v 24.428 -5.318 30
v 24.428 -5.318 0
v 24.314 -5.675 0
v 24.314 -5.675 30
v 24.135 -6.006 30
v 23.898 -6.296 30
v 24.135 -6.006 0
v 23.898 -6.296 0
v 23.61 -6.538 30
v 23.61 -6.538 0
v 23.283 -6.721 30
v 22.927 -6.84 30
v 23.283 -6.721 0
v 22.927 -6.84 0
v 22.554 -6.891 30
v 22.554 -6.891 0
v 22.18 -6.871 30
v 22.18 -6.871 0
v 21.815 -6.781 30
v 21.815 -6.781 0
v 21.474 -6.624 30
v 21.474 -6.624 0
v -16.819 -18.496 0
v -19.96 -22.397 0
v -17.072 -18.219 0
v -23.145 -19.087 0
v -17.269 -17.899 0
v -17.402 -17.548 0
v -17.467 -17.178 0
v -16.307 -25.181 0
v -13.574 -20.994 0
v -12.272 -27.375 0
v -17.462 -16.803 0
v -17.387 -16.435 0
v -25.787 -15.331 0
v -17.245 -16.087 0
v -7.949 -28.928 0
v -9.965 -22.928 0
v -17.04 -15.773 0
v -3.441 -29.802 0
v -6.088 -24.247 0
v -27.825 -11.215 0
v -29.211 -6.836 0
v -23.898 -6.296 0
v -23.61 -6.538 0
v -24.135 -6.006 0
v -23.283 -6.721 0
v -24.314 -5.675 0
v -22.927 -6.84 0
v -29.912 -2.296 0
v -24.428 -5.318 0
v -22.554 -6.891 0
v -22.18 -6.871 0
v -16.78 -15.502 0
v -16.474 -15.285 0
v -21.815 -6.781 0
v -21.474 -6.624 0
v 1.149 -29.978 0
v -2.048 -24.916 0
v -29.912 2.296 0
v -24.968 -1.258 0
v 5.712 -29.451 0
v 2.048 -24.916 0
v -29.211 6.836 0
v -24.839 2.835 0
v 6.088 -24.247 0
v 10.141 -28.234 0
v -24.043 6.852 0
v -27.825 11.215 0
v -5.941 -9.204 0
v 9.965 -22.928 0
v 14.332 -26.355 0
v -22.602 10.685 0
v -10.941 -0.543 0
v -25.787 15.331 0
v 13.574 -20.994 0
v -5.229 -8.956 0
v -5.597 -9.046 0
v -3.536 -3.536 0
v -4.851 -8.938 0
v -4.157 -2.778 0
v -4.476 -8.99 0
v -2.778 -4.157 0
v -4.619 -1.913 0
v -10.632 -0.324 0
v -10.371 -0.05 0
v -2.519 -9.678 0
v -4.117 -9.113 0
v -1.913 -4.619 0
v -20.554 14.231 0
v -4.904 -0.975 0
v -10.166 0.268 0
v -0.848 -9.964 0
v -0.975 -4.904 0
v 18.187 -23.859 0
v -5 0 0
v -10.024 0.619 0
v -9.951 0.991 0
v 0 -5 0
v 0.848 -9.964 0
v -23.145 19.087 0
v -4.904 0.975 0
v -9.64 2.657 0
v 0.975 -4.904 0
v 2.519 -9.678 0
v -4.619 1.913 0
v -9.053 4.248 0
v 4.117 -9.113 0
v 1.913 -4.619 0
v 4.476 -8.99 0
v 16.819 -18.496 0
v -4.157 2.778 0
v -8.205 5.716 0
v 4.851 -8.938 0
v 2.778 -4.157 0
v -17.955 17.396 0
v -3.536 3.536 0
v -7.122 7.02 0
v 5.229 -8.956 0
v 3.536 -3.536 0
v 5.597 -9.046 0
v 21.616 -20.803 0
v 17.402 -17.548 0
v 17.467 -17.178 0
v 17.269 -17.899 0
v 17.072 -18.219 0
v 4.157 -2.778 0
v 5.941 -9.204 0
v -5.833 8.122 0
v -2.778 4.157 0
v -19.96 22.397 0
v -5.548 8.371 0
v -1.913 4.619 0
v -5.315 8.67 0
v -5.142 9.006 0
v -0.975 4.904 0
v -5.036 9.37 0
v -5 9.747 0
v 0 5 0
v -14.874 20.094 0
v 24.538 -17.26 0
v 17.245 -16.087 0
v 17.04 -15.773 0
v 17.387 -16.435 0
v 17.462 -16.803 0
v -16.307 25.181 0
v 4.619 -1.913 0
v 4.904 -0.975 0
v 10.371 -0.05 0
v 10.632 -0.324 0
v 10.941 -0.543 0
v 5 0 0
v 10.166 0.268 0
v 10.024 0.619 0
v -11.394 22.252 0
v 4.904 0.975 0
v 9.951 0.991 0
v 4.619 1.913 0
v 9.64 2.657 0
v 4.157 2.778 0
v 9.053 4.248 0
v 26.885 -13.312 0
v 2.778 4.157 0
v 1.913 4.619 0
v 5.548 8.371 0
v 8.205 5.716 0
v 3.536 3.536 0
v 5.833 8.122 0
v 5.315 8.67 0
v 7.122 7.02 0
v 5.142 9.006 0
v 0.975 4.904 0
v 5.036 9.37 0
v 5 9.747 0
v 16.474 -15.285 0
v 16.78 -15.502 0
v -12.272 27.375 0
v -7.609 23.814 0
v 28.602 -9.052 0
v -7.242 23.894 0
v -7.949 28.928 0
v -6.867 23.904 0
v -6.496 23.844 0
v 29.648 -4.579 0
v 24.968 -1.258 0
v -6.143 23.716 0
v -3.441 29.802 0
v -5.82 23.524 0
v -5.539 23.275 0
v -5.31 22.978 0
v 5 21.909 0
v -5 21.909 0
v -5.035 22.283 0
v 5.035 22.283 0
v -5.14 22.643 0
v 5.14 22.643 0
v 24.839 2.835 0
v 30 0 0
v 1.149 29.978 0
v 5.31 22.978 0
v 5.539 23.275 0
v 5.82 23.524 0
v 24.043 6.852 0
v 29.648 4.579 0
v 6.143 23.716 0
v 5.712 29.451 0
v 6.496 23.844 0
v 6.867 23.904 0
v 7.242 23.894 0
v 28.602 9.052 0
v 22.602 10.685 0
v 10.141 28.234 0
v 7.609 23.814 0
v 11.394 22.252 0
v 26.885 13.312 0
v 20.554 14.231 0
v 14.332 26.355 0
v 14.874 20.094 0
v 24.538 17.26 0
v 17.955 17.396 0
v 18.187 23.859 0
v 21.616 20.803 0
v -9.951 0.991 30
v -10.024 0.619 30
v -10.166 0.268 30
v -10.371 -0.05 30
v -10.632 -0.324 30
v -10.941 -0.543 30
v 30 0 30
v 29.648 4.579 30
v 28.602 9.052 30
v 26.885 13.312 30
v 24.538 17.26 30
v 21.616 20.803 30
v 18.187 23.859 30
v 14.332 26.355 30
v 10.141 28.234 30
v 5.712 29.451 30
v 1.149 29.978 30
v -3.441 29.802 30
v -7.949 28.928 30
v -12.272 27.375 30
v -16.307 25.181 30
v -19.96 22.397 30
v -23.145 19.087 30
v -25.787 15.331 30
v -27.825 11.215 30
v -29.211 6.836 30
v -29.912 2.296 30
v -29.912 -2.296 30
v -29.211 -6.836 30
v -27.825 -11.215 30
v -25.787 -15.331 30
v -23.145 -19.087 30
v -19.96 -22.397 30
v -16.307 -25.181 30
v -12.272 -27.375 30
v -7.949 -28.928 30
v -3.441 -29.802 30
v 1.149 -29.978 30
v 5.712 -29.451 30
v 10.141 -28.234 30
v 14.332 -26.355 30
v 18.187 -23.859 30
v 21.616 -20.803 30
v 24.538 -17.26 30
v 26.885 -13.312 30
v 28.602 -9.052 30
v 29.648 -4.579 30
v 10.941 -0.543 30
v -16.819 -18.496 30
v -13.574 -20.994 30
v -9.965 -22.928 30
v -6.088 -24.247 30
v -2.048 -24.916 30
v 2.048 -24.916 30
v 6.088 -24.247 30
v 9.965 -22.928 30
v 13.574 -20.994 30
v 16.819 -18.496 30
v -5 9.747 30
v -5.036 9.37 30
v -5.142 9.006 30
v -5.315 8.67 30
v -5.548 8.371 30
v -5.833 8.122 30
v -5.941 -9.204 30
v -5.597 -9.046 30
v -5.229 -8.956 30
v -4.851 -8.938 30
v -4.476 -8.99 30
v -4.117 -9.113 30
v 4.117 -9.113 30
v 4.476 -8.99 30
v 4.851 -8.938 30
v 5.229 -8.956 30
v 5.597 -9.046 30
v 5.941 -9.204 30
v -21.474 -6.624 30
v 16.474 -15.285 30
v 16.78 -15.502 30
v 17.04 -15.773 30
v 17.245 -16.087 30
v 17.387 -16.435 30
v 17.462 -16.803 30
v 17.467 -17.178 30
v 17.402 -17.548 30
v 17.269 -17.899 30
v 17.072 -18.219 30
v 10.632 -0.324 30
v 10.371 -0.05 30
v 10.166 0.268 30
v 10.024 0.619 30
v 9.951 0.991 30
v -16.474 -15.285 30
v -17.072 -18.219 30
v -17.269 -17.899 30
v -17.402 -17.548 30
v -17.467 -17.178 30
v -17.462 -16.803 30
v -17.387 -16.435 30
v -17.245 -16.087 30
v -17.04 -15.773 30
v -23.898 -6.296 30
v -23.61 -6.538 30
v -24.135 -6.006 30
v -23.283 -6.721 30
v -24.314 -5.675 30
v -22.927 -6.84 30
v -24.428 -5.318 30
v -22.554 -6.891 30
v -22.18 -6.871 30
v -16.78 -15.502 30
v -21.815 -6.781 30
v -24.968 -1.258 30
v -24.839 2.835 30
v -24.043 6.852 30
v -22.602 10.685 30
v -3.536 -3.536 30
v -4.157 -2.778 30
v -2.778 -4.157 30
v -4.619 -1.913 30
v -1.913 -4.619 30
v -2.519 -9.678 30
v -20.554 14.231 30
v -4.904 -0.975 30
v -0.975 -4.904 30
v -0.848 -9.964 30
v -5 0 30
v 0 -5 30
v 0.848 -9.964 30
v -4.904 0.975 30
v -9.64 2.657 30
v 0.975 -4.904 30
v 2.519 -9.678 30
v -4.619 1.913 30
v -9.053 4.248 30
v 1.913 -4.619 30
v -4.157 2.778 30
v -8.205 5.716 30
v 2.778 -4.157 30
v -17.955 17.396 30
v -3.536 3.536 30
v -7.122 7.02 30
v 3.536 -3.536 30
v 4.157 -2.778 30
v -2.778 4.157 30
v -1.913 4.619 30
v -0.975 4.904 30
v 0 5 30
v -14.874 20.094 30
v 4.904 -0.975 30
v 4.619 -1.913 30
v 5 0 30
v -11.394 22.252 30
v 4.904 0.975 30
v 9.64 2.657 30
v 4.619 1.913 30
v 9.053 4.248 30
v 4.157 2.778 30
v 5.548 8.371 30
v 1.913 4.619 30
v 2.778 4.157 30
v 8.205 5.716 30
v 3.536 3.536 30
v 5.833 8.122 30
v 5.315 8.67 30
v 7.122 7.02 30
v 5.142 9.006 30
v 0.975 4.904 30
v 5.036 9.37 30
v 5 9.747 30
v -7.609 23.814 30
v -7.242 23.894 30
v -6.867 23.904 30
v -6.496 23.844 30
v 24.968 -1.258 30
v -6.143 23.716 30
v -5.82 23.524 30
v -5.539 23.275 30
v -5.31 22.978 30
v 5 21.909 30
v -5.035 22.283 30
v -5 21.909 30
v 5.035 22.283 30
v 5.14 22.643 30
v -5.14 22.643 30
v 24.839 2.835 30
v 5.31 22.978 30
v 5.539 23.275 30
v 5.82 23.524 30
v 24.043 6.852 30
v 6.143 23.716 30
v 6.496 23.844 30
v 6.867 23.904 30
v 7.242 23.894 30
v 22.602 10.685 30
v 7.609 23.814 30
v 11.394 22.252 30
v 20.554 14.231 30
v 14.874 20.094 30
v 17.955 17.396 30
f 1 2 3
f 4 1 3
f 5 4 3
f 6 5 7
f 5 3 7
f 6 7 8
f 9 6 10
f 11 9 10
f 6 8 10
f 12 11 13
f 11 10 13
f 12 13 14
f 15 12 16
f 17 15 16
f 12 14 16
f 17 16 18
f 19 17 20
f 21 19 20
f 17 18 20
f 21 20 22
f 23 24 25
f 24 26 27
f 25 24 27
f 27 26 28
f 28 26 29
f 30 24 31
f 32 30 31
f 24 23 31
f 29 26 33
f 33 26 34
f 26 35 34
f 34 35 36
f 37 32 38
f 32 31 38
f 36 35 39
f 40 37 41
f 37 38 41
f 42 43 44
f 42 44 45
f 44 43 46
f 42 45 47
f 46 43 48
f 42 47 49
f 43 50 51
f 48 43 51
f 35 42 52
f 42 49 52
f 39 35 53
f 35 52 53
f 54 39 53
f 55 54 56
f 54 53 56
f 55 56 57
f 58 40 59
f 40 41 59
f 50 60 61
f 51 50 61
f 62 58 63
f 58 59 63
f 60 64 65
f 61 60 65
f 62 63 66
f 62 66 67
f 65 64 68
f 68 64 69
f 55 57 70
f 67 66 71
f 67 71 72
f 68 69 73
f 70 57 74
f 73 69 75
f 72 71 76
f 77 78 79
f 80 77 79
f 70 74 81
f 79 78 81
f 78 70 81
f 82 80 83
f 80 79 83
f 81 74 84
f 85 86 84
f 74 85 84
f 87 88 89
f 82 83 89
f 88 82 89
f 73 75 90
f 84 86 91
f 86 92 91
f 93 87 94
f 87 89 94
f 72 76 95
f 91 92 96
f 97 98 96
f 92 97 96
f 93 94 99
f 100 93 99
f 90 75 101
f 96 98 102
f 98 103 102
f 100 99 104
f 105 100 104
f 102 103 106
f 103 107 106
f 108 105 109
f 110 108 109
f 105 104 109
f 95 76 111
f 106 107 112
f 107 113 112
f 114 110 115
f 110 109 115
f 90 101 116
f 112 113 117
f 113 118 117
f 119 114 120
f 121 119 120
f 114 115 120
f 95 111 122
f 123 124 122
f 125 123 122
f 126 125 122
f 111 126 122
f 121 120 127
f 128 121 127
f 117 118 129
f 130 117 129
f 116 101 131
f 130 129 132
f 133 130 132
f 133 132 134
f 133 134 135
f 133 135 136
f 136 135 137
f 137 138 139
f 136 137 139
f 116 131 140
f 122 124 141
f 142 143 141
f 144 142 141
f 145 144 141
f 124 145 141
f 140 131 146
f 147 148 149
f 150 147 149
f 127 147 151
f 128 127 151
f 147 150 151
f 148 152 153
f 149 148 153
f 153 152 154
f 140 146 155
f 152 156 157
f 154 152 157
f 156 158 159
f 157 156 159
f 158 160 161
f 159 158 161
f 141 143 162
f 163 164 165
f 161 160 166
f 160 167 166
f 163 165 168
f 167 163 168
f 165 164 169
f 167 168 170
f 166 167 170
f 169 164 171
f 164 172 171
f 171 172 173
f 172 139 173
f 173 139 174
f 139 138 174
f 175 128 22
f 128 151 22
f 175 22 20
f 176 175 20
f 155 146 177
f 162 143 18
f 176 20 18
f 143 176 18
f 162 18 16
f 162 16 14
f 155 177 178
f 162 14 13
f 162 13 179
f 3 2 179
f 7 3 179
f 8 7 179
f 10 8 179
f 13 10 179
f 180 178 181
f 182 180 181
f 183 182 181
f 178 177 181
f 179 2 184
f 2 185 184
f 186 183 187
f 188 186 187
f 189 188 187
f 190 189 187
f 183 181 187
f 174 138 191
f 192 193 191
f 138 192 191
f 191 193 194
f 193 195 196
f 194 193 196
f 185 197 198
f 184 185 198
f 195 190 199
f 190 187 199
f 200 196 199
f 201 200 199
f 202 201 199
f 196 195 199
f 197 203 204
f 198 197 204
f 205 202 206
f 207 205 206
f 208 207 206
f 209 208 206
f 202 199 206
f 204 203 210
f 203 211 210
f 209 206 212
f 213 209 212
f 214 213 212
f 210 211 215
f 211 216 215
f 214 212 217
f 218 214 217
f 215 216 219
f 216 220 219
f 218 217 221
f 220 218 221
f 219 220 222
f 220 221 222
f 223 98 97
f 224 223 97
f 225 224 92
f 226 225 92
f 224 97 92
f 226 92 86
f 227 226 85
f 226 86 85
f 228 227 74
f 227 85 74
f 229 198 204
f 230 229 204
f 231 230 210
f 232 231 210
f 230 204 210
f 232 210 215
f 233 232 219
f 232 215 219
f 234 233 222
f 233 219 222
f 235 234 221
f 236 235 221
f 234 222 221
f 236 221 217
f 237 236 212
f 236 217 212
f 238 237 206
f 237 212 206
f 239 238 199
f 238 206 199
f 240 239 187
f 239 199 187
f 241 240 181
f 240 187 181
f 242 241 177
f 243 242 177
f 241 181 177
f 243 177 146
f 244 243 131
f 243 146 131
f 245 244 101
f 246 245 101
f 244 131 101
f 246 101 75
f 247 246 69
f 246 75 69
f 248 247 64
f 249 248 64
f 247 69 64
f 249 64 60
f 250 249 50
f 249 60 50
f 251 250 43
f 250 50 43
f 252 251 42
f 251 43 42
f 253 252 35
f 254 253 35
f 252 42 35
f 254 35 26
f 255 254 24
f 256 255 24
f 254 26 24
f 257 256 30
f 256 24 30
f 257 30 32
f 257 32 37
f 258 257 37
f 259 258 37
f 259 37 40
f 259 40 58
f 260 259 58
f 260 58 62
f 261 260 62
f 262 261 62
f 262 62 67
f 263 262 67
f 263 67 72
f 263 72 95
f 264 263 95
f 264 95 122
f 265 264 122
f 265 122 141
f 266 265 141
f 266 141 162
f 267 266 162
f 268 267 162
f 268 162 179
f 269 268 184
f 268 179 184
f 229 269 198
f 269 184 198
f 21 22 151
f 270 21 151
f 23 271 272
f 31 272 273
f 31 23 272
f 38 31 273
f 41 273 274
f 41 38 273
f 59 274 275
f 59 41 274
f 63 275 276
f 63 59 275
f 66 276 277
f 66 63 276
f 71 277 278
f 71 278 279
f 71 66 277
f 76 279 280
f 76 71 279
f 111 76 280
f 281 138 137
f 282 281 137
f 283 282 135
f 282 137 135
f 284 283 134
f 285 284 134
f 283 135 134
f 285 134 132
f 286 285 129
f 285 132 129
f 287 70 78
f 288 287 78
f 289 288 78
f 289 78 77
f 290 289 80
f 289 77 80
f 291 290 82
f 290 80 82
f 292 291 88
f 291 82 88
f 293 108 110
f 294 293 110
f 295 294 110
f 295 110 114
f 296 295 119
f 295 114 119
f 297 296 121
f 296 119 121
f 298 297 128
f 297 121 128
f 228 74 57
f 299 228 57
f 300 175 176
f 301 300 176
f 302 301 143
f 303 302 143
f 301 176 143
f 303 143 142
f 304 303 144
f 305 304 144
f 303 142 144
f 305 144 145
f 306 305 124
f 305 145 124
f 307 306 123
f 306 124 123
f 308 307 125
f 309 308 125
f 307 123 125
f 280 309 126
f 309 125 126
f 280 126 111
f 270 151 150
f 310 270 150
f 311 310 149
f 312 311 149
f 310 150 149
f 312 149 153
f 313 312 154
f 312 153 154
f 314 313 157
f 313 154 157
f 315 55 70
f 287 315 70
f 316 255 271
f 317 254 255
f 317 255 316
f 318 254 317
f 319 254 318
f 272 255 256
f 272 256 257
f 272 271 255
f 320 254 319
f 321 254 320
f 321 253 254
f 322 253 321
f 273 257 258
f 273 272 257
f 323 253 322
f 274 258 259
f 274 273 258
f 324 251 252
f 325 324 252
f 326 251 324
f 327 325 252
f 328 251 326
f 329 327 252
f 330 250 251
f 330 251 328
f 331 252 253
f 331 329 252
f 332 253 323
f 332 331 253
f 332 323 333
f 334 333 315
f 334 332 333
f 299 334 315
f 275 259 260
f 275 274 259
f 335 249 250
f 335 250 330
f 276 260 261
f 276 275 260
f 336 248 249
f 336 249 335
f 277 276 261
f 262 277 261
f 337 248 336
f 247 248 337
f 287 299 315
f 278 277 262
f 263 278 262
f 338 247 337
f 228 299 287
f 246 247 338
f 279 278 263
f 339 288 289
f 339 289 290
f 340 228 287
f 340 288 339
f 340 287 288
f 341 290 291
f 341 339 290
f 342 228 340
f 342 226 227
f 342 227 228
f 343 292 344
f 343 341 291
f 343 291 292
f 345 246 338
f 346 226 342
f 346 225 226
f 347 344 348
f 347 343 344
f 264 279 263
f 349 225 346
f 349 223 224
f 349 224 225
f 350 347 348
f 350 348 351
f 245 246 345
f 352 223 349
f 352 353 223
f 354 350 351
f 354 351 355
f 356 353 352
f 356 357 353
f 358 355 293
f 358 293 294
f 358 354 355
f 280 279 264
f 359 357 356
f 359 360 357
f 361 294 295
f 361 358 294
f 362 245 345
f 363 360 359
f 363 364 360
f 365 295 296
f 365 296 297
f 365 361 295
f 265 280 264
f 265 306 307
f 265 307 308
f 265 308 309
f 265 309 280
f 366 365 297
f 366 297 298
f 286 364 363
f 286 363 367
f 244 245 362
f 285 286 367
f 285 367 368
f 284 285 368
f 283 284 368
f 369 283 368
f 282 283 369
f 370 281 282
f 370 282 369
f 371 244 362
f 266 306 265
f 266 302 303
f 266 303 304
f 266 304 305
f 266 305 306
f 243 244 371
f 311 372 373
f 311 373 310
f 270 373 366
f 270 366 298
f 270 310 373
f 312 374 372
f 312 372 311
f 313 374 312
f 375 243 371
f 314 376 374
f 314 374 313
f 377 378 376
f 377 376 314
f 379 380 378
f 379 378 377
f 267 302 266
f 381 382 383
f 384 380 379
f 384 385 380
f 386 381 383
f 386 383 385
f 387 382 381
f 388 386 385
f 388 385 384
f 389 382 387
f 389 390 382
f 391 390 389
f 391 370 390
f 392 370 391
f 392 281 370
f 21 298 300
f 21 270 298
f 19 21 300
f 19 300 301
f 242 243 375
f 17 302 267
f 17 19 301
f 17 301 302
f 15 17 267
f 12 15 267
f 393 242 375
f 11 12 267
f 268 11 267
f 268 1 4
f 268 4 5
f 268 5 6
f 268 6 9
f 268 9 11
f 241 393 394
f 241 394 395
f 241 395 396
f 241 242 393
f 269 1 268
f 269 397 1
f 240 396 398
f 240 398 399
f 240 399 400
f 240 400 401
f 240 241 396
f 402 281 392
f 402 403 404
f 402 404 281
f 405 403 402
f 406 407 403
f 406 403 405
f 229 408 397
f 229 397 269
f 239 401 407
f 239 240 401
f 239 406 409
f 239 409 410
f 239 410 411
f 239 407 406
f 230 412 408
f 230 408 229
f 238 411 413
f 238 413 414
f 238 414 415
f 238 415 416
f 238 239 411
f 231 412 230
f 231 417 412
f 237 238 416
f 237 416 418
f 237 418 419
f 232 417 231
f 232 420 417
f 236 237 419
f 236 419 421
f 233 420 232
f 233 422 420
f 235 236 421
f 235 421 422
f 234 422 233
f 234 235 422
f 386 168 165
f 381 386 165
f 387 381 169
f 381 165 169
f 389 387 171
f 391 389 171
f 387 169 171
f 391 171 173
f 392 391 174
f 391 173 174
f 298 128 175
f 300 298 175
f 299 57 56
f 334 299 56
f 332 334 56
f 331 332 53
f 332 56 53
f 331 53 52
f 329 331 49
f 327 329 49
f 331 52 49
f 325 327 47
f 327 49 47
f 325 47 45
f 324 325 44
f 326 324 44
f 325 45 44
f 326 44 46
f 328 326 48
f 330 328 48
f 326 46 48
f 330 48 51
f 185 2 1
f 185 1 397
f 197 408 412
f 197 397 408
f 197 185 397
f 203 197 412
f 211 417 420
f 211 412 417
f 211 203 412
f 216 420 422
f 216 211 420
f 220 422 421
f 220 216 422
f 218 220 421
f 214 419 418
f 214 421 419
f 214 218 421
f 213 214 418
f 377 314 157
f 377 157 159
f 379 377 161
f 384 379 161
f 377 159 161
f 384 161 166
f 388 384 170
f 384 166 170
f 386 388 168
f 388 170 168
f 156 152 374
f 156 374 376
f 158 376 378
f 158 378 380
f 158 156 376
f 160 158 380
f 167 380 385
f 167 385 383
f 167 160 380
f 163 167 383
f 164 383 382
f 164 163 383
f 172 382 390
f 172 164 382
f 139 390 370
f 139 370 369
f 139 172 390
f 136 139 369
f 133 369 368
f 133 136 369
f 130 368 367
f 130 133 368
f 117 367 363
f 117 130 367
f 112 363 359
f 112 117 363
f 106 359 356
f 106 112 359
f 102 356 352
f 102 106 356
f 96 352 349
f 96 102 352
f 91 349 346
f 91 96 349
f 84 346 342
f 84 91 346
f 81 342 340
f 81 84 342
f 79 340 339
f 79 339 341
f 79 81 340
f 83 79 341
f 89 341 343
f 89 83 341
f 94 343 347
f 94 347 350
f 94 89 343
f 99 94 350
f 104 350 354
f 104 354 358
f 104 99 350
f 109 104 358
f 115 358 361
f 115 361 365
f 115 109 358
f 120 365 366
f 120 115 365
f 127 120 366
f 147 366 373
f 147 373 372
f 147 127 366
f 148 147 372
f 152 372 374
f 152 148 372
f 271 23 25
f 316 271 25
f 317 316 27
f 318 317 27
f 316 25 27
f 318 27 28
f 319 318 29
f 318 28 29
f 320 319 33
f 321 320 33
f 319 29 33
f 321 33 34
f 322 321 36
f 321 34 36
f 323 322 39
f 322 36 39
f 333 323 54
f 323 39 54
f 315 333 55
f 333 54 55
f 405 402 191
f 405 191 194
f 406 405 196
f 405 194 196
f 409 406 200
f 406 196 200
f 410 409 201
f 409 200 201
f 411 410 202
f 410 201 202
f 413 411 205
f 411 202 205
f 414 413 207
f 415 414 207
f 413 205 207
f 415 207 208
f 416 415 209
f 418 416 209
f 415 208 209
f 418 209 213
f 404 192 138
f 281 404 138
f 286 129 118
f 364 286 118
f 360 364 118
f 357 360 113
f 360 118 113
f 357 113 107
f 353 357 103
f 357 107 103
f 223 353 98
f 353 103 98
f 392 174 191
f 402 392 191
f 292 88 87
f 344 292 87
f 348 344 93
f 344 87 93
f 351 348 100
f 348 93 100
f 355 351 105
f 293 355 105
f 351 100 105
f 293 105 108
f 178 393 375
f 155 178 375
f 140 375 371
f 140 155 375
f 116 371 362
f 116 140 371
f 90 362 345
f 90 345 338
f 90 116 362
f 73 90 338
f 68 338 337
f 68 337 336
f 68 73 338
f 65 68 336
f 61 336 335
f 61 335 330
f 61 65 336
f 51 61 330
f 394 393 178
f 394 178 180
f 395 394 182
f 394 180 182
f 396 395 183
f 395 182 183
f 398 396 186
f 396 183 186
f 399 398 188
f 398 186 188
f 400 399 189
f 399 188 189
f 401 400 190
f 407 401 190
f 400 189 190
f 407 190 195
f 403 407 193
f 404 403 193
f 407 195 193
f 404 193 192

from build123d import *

# Parameters (mm, degrees)
SKETCH1_R           = 30
SKETCH1_R_2         = 25
SKETCH1_R_3         = 10
SKETCH1_R_4         = 5
BOSS_EXTRUDE1_DEPTH = 30


with BuildPart() as part:
    # Sketch1 → Boss-Extrude1 (new body)
    # profile 1 of 5: a face of its own
    with BuildSketch(Plane.XY):
        Circle(SKETCH1_R)
        Circle(SKETCH1_R_2, mode=Mode.SUBTRACT)
    # profile 2 of 5: a face of its own
    with BuildSketch(Plane.XY):
        with BuildLine():
            ThreePointArc((-7.608695652, 23.814024239), (-5.820464351, 23.524048006), (-5, 21.9089023))
            Line((-5, 21.9089023), (-5, 9.746794345))
            ThreePointArc((-5, 9.746794345), (-5.220486958, 8.833923416), (-5.833333333, 8.122328621))
            ThreePointArc((-5.833333333, 8.122328621), (0, 10), (5.833333333, 8.122328621))
            ThreePointArc((5.833333333, 8.122328621), (5.220486958, 8.833923416), (5, 9.746794345))
            Line((5, 9.746794345), (5, 21.9089023))
            ThreePointArc((5, 21.9089023), (5.820464351, 23.524048006), (7.608695652, 23.814024239))
            ThreePointArc((7.608695652, 23.814024239), (0, 25), (-7.608695652, 23.814024239))
        make_face()
    # profile 3 of 5: a face of its own
    with BuildSketch(Plane.XY):
        with BuildLine():
            ThreePointArc((-21.473665961, -6.624324131), (-23.282655349, -6.721354014), (-24.427897784, -5.317688395))
            ThreePointArc((-24.427897784, -5.317688395), (-21.650635095, -12.5), (-16.819202132, -18.496335844))
            ThreePointArc((-16.819202132, -18.496335844), (-17.462190998, -16.802693993), (-16.473665961, -15.284578169))
            Line((-16.473665961, -15.284578169), (-5.940971508, -9.203524191))
            ThreePointArc((-5.940971508, -9.203524191), (-5.040158614, -8.938036034), (-4.117476257, -9.112979166))
            ThreePointArc((-4.117476257, -9.112979166), (-8.660254038, -5), (-9.95080959, 0.990650545))
            ThreePointArc((-9.95080959, 0.990650545), (-10.260645572, 0.104112618), (-10.940971508, -0.543270153))
            Line((-10.940971508, -0.543270153), (-21.473665961, -6.624324131))
        make_face()
    # profile 4 of 5: a face of its own
    with BuildSketch(Plane.XY):
        with BuildLine():
            ThreePointArc((10.940971508, -0.543270153), (10.260645572, 0.104112618), (9.95080959, 0.990650545))
            ThreePointArc((9.95080959, 0.990650545), (9.987694827, 0.49593553), (10, 0))
            ThreePointArc((10, 0), (8.40162968, -5.423340181), (4.117476257, -9.112979166))
            ThreePointArc((4.117476257, -9.112979166), (5.040158614, -8.938036034), (5.940971508, -9.203524191))
            Line((5.940971508, -9.203524191), (16.473665961, -15.284578169))
            ThreePointArc((16.473665961, -15.284578169), (17.462190998, -16.802693993), (16.819202132, -18.496335844))
            ThreePointArc((16.819202132, -18.496335844), (21.650635095, -12.5), (24.427897784, -5.317688395))
            ThreePointArc((24.427897784, -5.317688395), (23.282655349, -6.721354014), (21.473665961, -6.624324131))
            Line((21.473665961, -6.624324131), (10.940971508, -0.543270153))
        make_face()
    # profile 5 of 5: a face of its own
    with BuildSketch(Plane.XY):
        Circle(SKETCH1_R_3)
        Circle(SKETCH1_R_4, mode=Mode.SUBTRACT)
    extrude(amount=BOSS_EXTRUDE1_DEPTH)


solid = part.part
